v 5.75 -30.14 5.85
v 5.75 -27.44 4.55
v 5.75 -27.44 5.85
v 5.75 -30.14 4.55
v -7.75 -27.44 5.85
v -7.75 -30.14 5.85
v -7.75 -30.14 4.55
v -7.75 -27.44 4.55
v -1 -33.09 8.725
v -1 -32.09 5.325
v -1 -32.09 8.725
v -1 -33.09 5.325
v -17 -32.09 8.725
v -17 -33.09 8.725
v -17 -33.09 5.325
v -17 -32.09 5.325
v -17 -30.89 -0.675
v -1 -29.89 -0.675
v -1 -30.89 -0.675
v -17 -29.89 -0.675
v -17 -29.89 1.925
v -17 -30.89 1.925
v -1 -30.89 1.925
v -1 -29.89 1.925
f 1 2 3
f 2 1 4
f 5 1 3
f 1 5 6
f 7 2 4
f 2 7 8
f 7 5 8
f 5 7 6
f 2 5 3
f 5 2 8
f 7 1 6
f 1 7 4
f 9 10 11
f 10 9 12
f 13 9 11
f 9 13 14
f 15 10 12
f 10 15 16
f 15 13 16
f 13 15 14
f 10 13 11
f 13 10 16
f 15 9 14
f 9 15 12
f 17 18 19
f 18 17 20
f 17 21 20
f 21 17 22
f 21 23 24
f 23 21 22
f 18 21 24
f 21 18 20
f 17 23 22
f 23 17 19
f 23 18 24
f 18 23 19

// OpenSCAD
include <BOSL2/std.scad>
include <BOSL2/rounding.scad>
vf=360;
//version number
version="10"; //version number
version_h=1; //depth of version number pocket

//epsilon value
eps=0.01;

//CASE BODY
//case stackup
echo("----------CASE----------");
face_h = 1.4;
lcd_h = 2.2;
pcb_h = 1.6;
standoff_h = 3.4;
floor_h = 1.4; //was 1.6... //was 2.4

top_h = face_h+lcd_h+pcb_h;
bottom_h = pcb_h+standoff_h+floor_h;
case_h=face_h+lcd_h+pcb_h+standoff_h+floor_h;
echo(top_h=top_h, bottom_h=bottom_h, case_h=case_h);

standoff_cut = 8.4; //length of the standoff arm excluding the rounded bit
standoff_d = 3; //diameter of standoff rounded bit

//mating walls
wall_inner_xy = 0.8; //inner wall thickness EACH side
wall_gap_xy=0.6; //was 0.6, but changed to one extruder width //gap between walls EACH side
wall_outer_xy=0.8; //outer wall thickness
wall_width=wall_inner_xy+wall_gap_xy+wall_outer_xy;
echo(wall_width=wall_width);

//pcb dimentions and tolerance
pcb_xy = 60;
pcb_tolerance_xy = 0.4; //spacing on EACH side
pcb_cavity_xy=(pcb_tolerance_xy*2)+pcb_xy; //bottom half PCB cavity
top_cavity_xy=pcb_cavity_xy+(wall_gap_xy*2)+(wall_inner_xy*2); //pcb+innerwall cavity in top
echo(pcb_cavity_xy=pcb_cavity_xy, top_cavity_xy=top_cavity_xy);

//full outer case dimentions
body_xy=(wall_outer_xy*2)+(wall_gap_xy*2)+(wall_inner_xy*2)+pcb_cavity_xy;
echo(body_xy=body_xy);

//edge chamfers, top and bottom
chamfer_top_h=2.4;
chamfer_bottom_h=1.4;

//TOP CASE FEATURES
//LCD body
lcd_x=34.6 + 2; //36.8;
lcd_y=47.8 + 2; //52.2;
//LCD viewable area
lcd_va_x=33.6 - 1; //32.4; 
lcd_va_y=43.6 - 1; //42.8;
lcd_va_base_h = 0.4; //two layers of material without chamfer on top of lcd
lcd_va_chamfer_h = face_h - lcd_va_base_h; //the chamfered "view port"
lcd_va_offset_y = 1.8 + (1/2); //from top of LCD body to top of viewable area

//10P header
head_10p_x = 11.6;
head_10p_y = 29.00;
head_10p_offset=4;

echo("------PROGRAMMING HEADER-------");
//cut in bottom of top half to accomidate the ends/solder of the programming header on the bottom layer
head_prog_x = 2.54+.4;
head_prog_y=(2.54*3)+0.55;
head_prog_bottom_h=lcd_h;  //bottom of header (top of PCB, top of case)
head_prog_top_h=floor_h;
head_prog_offset_x=10.75;
head_prog_offset_y=9.6;//9.6
head_prog_connector_max_h=floor_h+standoff_h;
echo(head_prog_connector_max_h=head_prog_connector_max_h);

//from datasheet for milled, low profile pin header
head_prog_connector_total_h=7.43;
head_prog_connector_pin_h=2.7;
head_prog_connector_body_h= head_prog_connector_total_h-head_prog_connector_pin_h;
head_prog_connector_clearance_h=head_prog_connector_max_h-head_prog_connector_body_h;
echo(head_prog_connector_body_h=head_prog_connector_body_h, head_prog_connector_clearance_h=head_prog_connector_clearance_h );

//mounting screws
echo("----------SCREWS----------");
screw_d=3.4;
screw_offset_xy=4;
screw_head_h=1.7;
screw_head_d1=screw_d;
screw_head_d2=6.2;
heatset_nut_d=4.4; //4.3/3.9;
heatset_nut_max_h=floor_h+standoff_h;
screw_distance_to_nut_h=top_h;
echo(screw_distance_to_nut_h=screw_distance_to_nut_h);

screw_h=8;
screw_depth_nut_h=screw_h-screw_distance_to_nut_h;
echo(screw_h=screw_h, screw_depth_nut_h=screw_depth_nut_h);

echo("----------NUTS----------");
heatset_nut_h=3;
heatset_nut_bottom_clearance_h=.8; //how much deeper should the hole be than the nut? effects minimum floor thickness
heatset_nut_unused_h=heatset_nut_h-screw_depth_nut_h;
echo(heatset_nut_max_h=heatset_nut_max_h);
echo(heatset_nut_h=heatset_nut_h,heatset_nut_unused_h=heatset_nut_unused_h);

//push buttons (with countersink)  
//assumes center button is at Y=0 (centered)  
echo("--------USER BUTTONS--------");
button_distance_to_top=face_h+lcd_h;
echo(button_distance_to_top=button_distance_to_top);

//button body cutout
butt_body_x=9.2;
butt_body_y=28; 
butt_body_h=1.5;
butt_body_cavity_h=0.8; 
echo(butt_body_cavity_h=butt_body_cavity_h);

//This is stack up for short buttons with button caps
butt_cap_h=4;
butt_cap_d=5+.4;
butt_cap_rim_h=1; 
butt_cap_rim_d=6.8+.4;
butt_cap_center_extra_space_d=0.2; //for some reason our printer makes the center hole slightly too tight, so we add some space
//This is the 1mm cap rim + 0.7 of the button body height +0.1 (even layer height)
//(to keep cap rim being stuck under the case)
butt_cap_rim_cavity_h=butt_cap_rim_h+(butt_body_h-butt_body_cavity_h)+.1;
echo(butt_cap_rim_cavity_h=butt_cap_rim_cavity_h);
butt_cap_shaft_h=button_distance_to_top-butt_body_cavity_h-butt_cap_rim_cavity_h;
echo(butt_cap_shaft_h=butt_cap_shaft_h);

//This is stack up with long shaft button
//counter sink 
butt_sink_h=1.7; 
butt_sink_d1=3.2;
butt_sink_d2=6.2;
//button hole
butt_offset_x=7.2; //edge of pcb to center of button
butt_spread_y=10; //center of center button to center of top and bottom buttons
butt_hole_d=3.2;
butt_hole_h=top_h-(pcb_h+butt_body_h+butt_sink_h);





//BOTTOM CASE FEATURES
//retaining lip for the case
bottom_lip_width=wall_gap_xy+wall_outer_xy;
bottom_lip_h=pcb_h;

//sd card hole
sd_x=14;
sd_y=wall_width;
sd_offset_x=22;
sd_h=3.4;

//9p aux la header hole
head_aux_x=wall_width;
head_aux_y=12.8;
head_aux_h=4.8;

//USB C hole (currently blown out)
usb_x=wall_width;
usb_y=14; //blow out
usb_h=5.6; //blow out, 3.2;
print_layer_h=0.2;
usb_cut_layers=2;

//bootloader button hole
bootload_x=3;
bootload_y=4;
bootload_h=floor_h;
bootload_offset_x=27; //from top of flipped PCB
bootload_offset_y=14;    //from right of flipped PCB
bootload_spin=45;
echo("----------END----------");

//
// CASE TOP MODULES
//
module body_top(){
    //case body
    diff("mask"){
        cube(size=[body_xy, body_xy,top_h], anchor=BOTTOM){
            //top chamfer
            chamfer_list=[RIGHT, LEFT, BACK, FRONT];
            for( i = chamfer_list){
            edge_mask(TOP+i)
                chamfer_edge_mask(l=body_xy, chamfer=chamfer_top_h);
            }                        
        }    
    }
}

module cavity_top(){    
    //PCB area in top
    translate([0,0,-eps]){
        cube(size=[top_cavity_xy, top_cavity_xy, pcb_h+eps], anchor=BOTTOM);
    }
}

module lcd(){
    //LCD
    lcd_va_chamfer_eps_h=lcd_va_chamfer_h+eps+eps;
    translate([0,0,pcb_h]){
        union(){
            //body
            translate([0,0,-eps]){
                cube(size=[lcd_x, lcd_y, lcd_h+eps], anchor=BOTTOM);
            }
            //view area base (0.4=2 layers)
             translate([0, lcd_va_offset_y, lcd_h-eps]){
                 cube(size=[lcd_va_x, lcd_va_y, lcd_va_base_h+eps], anchor=BOTTOM);
            }           
            //view area chamfer, 45 degrees
            translate([0, lcd_va_offset_y, (lcd_h+lcd_va_base_h)-eps]){
                prismoid(size1=[lcd_va_x, lcd_va_y], size2=[lcd_va_x+(lcd_va_chamfer_eps_h*2), lcd_va_y+(lcd_va_chamfer_eps_h*2)], h=lcd_va_chamfer_eps_h);
            }
        }
    }
}

module screws(){
    //screw holes
    for(a=[1:-2:-1]){
        for(b=[1:-2:-1]){
             translate([a*((pcb_xy/2)-screw_offset_xy),b*((pcb_xy/2)-screw_offset_xy),0]){
                union(){
                    //shaft
                    translate([0,0,-eps]){
                        cylinder(h=(top_h-screw_head_h)+eps, d=screw_d, anchor=BOTTOM, $fn=100);
                    }
                    //countersink
                    translate([0,0,top_h-screw_head_h-eps]){
                        cylinder(h = screw_head_h+eps+eps, d1 = screw_head_d1, d2 = screw_head_d2, anchor=BOTTOM, $fn=100);
                    }
                }
            }
        }
    }
}

module buttons(){
     //buttons
    translate([-((pcb_xy/2)-butt_offset_x), 0,pcb_h]){
        union(){
            //button body
            translate([0,0,-eps]){
                cube(size=[butt_body_x, butt_body_y, butt_body_cavity_h+eps], anchor=BOTTOM);
            }
            //button holes
            if(0){
            //for(a=[-1:1:1]){
                translate([ 0, butt_spread_y*a, butt_body_cavity_h]){
                    union(){
                        translate([0,0,-eps]){
                            cylinder(h=butt_hole_h+eps , d=butt_hole_d, anchor=BOTTOM, $fn=100);  
                        }
                        translate([0,0,butt_hole_h-eps]){
                            cylinder(h = butt_sink_h+eps+eps, d1 = butt_sink_d1, d2 = butt_sink_d2, anchor=BOTTOM, $fn=100);
                        }                         
                    }
                }
            //}
            }
        }
    }

    butt_cap_extra_clear_d=[0,butt_cap_center_extra_space_d,0];
    //button holes for caps
    //for(a=[-1:1:1]){
        a=0;
        translate([ -((pcb_xy/2)-butt_offset_x), butt_spread_y*a, pcb_h+butt_body_cavity_h-eps]){
            translate([0,0,-eps]){
                cylinder(h = butt_cap_rim_cavity_h + eps, d =(butt_cap_rim_d + butt_cap_extra_clear_d[a+1]), anchor=BOTTOM, $fn=100);
            }
            translate([0,0,butt_cap_rim_cavity_h-eps]){
                cylinder(h = butt_cap_h+eps, d = butt_cap_d + butt_cap_extra_clear_d[a+1], anchor=BOTTOM, $fn=100);
            }  
        }
    //}       
}

module header_10P(){
    //10p header
    translate([(body_xy/2)+eps,0,-eps]){
        cube(size=[head_10p_x+eps, head_10p_y, top_h+eps+eps], anchor=BOTTOM+RIGHT);
    }
}

module header_prog_top(){
    //programming header cutout
    translate([-1*((pcb_xy/2)-head_prog_offset_x),-1*((pcb_xy/2)-head_prog_offset_y),pcb_h-eps]){
        cube(size=[head_prog_x,head_prog_y,head_prog_bottom_h+eps], anchor=BOTTOM);
    }
}                                                       

//
// CASE BOTTOM MODULES
//
module body_bottom(){
    //bottom and chamfers
    diff("mask"){
        cube(size=[body_xy, body_xy,bottom_h], anchor=BOTTOM){
            //bottom chamfer
            chamfer_list=[RIGHT, LEFT, BACK, FRONT];
            for( i = chamfer_list){
            edge_mask(BOTTOM+i)
                chamfer_edge_mask(l=body_xy, chamfer=chamfer_bottom_h);
            }                
        }   
    } 
} 

module pcb(){
    //PCB
    translate([0,0,(standoff_h+floor_h)]){
        cube(size=[pcb_cavity_xy, pcb_cavity_xy, pcb_h+eps], anchor=BOTTOM);
    }
}

module standoffs(){
    //standoffs
    standoff_edge = pcb_cavity_xy - (standoff_cut*2);
    shape = [[0,standoff_cut], [0,standoff_cut+standoff_edge], [standoff_cut,standoff_cut+standoff_edge], //left
            [standoff_cut,standoff_cut+standoff_edge+standoff_cut], [standoff_cut+standoff_edge, standoff_cut+standoff_edge+standoff_cut], [standoff_cut+standoff_edge, standoff_edge+standoff_cut], //top
            [standoff_cut+standoff_edge+standoff_cut, standoff_edge+standoff_cut], [standoff_cut+standoff_edge+standoff_cut,standoff_cut], [standoff_cut+standoff_edge,standoff_cut], //right
            [standoff_cut+standoff_edge,0], [standoff_cut,0], [standoff_cut,standoff_cut]]; //bottom
    radii = [0, 0, standoff_d, 0, 0, standoff_d, 0, 0, standoff_d, 0, 0, standoff_d];
    translate([-pcb_cavity_xy/2, -pcb_cavity_xy/2, floor_h]){
        linear_extrude(height=standoff_h+eps){
            polygon(round_corners(shape, radius = radii,$fn=64));
        }
    }  
}

module heatset_nuts(){
    //screw holes
    for(a=[1:-2:-1]){
        for(b=[1:-2:-1]){
            translate([a*((pcb_xy/2)-screw_offset_xy),b*((pcb_xy/2)-screw_offset_xy),heatset_nut_max_h-heatset_nut_h]){
                cylinder(h=heatset_nut_h+heatset_nut_bottom_clearance_h+eps, d=heatset_nut_d, anchor=BOTTOM, $fn=100);
            }
        }
    }    
}

module old_sd_card(){
    //sd card
    translate([-((body_xy/2)-sd_offset_x),-1*((body_xy/2)+eps),bottom_h+eps]){
        #cube(size=[sd_x,sd_y+eps+eps+eps,sd_h+eps], anchor=TOP+FRONT+LEFT);
    }    
}

module sd_card(){
    //la aux header
    //0.8mm straight (2 print beads)
    //rest chamfered (wall_width-0.8)

        //sd card
    translate([-((pcb_xy/2)-sd_offset_x),-1*((body_xy/2)-wall_width-eps),bottom_h+eps]){
        cube(size=[sd_x,0.8+eps+eps+eps,sd_h+eps], anchor=TOP+BACK+LEFT);
    }   

    translate([-((pcb_xy/2)-sd_offset_x), -1*((body_xy/2)-wall_width+0.8-eps), bottom_h-pcb_h]){
    rotate(a=[90,0,0]){        
        prismoid(size1=[sd_x,sd_h], size2=[sd_x+((wall_width-0.8)/2),sd_h+((wall_width-0.8)/2)], h=wall_width-0.8+eps+eps, anchor=BOTTOM+LEFT);
    }

    }
}


module sd_card_plug(){
    //la aux header
    //0.8mm straight (2 print beads)
    //rest chamfered (wall_width-0.8)
    sd_plug_clearance=0.5;
    cover_y=2;
        //sd card
    translate([-((pcb_xy/2)-sd_offset_x)+(sd_plug_clearance/2),-1*((body_xy/2)-wall_width-eps)+(sd_plug_clearance/2),bottom_h-pcb_h-(sd_plug_clearance/2)]){
        cube(size=[sd_x-sd_plug_clearance,wall_width+sd_plug_clearance,sd_h-pcb_h-sd_plug_clearance], anchor=TOP+BACK+LEFT);
       
        translate([-(cover_y/2)-(sd_plug_clearance/2),-wall_width-(sd_plug_clearance/2),(sd_h-pcb_h-(sd_plug_clearance/2))/2])
        cuboid(
            [sd_x+cover_y,1,sd_h], rounding=0.5,
            edges=[TOP+FRONT,TOP+RIGHT,TOP+LEFT,FRONT+RIGHT, FRONT+LEFT,BOTTOM+FRONT, BOTTOM+LEFT, BOTTOM+RIGHT ],
            anchor=BACK+LEFT+TOP,
            $fn=128
        );

        rotate([180,0,0])
        translate([-(cover_y/2)-(sd_plug_clearance/2),sd_plug_clearance/2,(sd_h+pcb_h+(sd_plug_clearance/2))/2])
        cuboid(
            [sd_x+cover_y,1,sd_h-(cover_y/2)+(sd_plug_clearance/2)-0.05], rounding=0.5,
            edges=[TOP+FRONT,TOP+RIGHT,TOP+LEFT,FRONT+RIGHT, FRONT+LEFT ],
            anchor=BACK+LEFT+TOP,
            $fn=128
        );        
    }   

    //translate([-((pcb_xy/2)-sd_offset_x), -1*((body_xy/2)-wall_width+0.8-eps), bottom_h-pcb_h]){
    //rotate(a=[90,0,0]){        
    //    prismoid(size1=[sd_x,sd_h], size2=[sd_x+((wall_width-0.8)/2),sd_h+((wall_width-0.8)/2)], h=wall_width-0.8+eps+eps, anchor=BOTTOM+LEFT);
    //}

    //}
}

module header_aux(){
    //la aux header
    //0.8mm straight (2 print beads)
    //rest chamfered (wall_width-0.8)

   /* translate([(body_xy/2)-wall_width-eps, 0, bottom_h-pcb_h-head_aux_x]){
        cube(size=[0.8+eps+eps+eps,head_aux_y,case_h], anchor=BOTTOM+LEFT);
     }

    translate([(body_xy/2)-eps-(wall_width-.8), 0, bottom_h-pcb_h]){
    rotate(a=[0,90,0]){        
        prismoid(size1=[head_aux_x,head_aux_y], size2=[head_aux_x+((wall_width-0.8)/2),head_aux_y+((wall_width-0.8)/2)], h=wall_width-0.8+eps+eps, anchor=BOTTOM+LEFT);
    }

    }*/

    translate([(body_xy/2)+eps, 0, bottom_h+eps]){
        cube(size=[head_aux_x+eps+eps,head_aux_y,head_aux_h], anchor=TOP+RIGHT);
    }   


}

module usb_bottom(){

    typec_d=3.16;
    typec_l=8.94;
    
    translate([-((body_xy/2)-wall_width-eps),0,bottom_h-pcb_h]){
        //inspired/informed by:
        //Object Name: Holder For TYPE-C or LIGHTNING and TRRS (e.g. Earphone Wraps) (OpenSCAD)
        //Author: Brian Khuu 2019
        //https://www.thingiverse.com/thing:3666075/files
        hull(){
            translate([0,((typec_l+0.5)-(typec_d))/2,0]){
                rotate(a=[0,90,0]) cylinder(d=typec_d, h=wall_width+eps+eps, $fn=100, anchor=TOP+LEFT);
            }
            translate([0,-((typec_l+0.5)-(typec_d))/2,0]){
                rotate(a=[0,90,0]) cylinder(d=typec_d, h=wall_width+eps+eps, $fn=100, anchor=TOP+LEFT);
            }
        }       
    }   

    //cut out the overhang, plus X layers of upper cutout curve for cleaner prints
    translate([-((body_xy/2)+eps),0,(bottom_h-pcb_h-(print_layer_h*usb_cut_layers)-eps)]){
        cube(size=[wall_width+eps+eps,((typec_l+0.5)-(typec_d))+2,usb_h], anchor=BOTTOM+LEFT);
    }      
    
}

module header_prog_bottom(){
    //programming header cutout
    head_prog_eps_h=head_prog_top_h+eps+eps;

    union(){

    translate([-1*((pcb_xy/2)-head_prog_offset_x),-1*((pcb_xy/2)-head_prog_offset_y),-eps]){
        cube(size=[head_prog_x,head_prog_y,head_prog_eps_h], anchor=BOTTOM);
    }   

    translate([-1*((pcb_xy/2)-head_prog_offset_x),-1*((pcb_xy/2)-head_prog_offset_y),-eps]){
        //cube(size=[head_prog_x,head_prog_y,head_prog_top_h+eps+eps], anchor=BOTTOM);
        prismoid(size2=[head_prog_x, head_prog_y], size1=[head_prog_x+(0.4*2)+eps, head_prog_y+(0.4*2)+eps], h=0.4);
    }   

    }
  
}

module bootloader_button(){
    //bootloader button hole
    bootload_eps_h=bootload_h+eps+eps;
    union(){
     
     translate([-1*((pcb_xy/2)-bootload_offset_x),((pcb_xy/2)-bootload_offset_y),-eps]){
        cube(size=[bootload_x,bootload_y,bootload_eps_h], anchor=BOTTOM, spin=bootload_spin);
    }       
     
     translate([-1*((pcb_xy/2)-bootload_offset_x),((pcb_xy/2)-bootload_offset_y),-eps]){
        //cube(size=[bootload_x,bootload_y,bootload_h+eps+eps], anchor=BOTTOM, spin=bootload_spin);
        prismoid(size2=[bootload_x,bootload_y], size1=[bootload_x+((bootload_eps_h-.8)*2), bootload_y+((bootload_eps_h-.8)*2)], h=bootload_eps_h-.8, spin=bootload_spin);
    }      
    }
}
    
module bottom_lip(){
    //mating edge lips
    translate([0,0,bottom_h+eps]){
        difference(){
            cube(size=[body_xy+eps, body_xy+eps, bottom_lip_h+eps], anchor=TOP);
            cube(size=[body_xy-(2*bottom_lip_width), body_xy-(2*bottom_lip_width),bottom_lip_h+eps], anchor=TOP);
        }
    } 

}

//
// CASE ASSEMBLY
//
module version_number(){
    linear_extrude(version_h){
        text(text=str("v",version), size=4, font = "Liberation Sans:style=Bold");
    }
}
module case_top(){
    difference(){
        body_top();
        cavity_top();
        lcd();
        screws();
        buttons();
        header_10P();
        header_prog_top();

        //add version number
        rotate([0,180,0]){
            translate([0, -31, -(version_h+(pcb_h-eps))]){
                //version_number();
            }
        }

    }            

}

module case_bottom(){



    difference(){
        body_bottom();
        pcb();
        standoffs();
        heatset_nuts();
        sd_card();
        header_aux();
        usb_bottom();
        header_prog_bottom();
        bootloader_button();
        bottom_lip();

        //add version number
        translate([0, -30, (floor_h+eps)-version_h]){
            //version_number();
        }        
    }

    translate([(body_xy/2)-wall_width,0,0]){
        difference(){

            //12.4
            cube([2, head_aux_y+1.4, bottom_h-pcb_h], anchor=BOTTOM+RIGHT);
            translate([eps,0,0]) cube([4+eps+eps,11.4,bottom_h-pcb_h+eps], anchor=BOTTOM+RIGHT);
        }
    }
}

//
// CASE DISPLAY
//
module print_3d(){
    translate([(body_xy/2)+2,0,top_h]){
        rotate([180,0,0]){
            case_top();
        }
    }
    translate([-((body_xy/2)+2),0,0]){
        case_bottom();
    }
}

module display_together(){
    translate([0,0,bottom_h+20]){

            case_top();
    }
    case_bottom();

}

module display_together_tight(){
    translate([0,0,bottom_h+.2]){

            case_top();
    }
    case_bottom();

}

//print_3d();
//case_top();
//case_bottom();
//display_together();
//display_together_tight();
#sd_card_plug();
    
